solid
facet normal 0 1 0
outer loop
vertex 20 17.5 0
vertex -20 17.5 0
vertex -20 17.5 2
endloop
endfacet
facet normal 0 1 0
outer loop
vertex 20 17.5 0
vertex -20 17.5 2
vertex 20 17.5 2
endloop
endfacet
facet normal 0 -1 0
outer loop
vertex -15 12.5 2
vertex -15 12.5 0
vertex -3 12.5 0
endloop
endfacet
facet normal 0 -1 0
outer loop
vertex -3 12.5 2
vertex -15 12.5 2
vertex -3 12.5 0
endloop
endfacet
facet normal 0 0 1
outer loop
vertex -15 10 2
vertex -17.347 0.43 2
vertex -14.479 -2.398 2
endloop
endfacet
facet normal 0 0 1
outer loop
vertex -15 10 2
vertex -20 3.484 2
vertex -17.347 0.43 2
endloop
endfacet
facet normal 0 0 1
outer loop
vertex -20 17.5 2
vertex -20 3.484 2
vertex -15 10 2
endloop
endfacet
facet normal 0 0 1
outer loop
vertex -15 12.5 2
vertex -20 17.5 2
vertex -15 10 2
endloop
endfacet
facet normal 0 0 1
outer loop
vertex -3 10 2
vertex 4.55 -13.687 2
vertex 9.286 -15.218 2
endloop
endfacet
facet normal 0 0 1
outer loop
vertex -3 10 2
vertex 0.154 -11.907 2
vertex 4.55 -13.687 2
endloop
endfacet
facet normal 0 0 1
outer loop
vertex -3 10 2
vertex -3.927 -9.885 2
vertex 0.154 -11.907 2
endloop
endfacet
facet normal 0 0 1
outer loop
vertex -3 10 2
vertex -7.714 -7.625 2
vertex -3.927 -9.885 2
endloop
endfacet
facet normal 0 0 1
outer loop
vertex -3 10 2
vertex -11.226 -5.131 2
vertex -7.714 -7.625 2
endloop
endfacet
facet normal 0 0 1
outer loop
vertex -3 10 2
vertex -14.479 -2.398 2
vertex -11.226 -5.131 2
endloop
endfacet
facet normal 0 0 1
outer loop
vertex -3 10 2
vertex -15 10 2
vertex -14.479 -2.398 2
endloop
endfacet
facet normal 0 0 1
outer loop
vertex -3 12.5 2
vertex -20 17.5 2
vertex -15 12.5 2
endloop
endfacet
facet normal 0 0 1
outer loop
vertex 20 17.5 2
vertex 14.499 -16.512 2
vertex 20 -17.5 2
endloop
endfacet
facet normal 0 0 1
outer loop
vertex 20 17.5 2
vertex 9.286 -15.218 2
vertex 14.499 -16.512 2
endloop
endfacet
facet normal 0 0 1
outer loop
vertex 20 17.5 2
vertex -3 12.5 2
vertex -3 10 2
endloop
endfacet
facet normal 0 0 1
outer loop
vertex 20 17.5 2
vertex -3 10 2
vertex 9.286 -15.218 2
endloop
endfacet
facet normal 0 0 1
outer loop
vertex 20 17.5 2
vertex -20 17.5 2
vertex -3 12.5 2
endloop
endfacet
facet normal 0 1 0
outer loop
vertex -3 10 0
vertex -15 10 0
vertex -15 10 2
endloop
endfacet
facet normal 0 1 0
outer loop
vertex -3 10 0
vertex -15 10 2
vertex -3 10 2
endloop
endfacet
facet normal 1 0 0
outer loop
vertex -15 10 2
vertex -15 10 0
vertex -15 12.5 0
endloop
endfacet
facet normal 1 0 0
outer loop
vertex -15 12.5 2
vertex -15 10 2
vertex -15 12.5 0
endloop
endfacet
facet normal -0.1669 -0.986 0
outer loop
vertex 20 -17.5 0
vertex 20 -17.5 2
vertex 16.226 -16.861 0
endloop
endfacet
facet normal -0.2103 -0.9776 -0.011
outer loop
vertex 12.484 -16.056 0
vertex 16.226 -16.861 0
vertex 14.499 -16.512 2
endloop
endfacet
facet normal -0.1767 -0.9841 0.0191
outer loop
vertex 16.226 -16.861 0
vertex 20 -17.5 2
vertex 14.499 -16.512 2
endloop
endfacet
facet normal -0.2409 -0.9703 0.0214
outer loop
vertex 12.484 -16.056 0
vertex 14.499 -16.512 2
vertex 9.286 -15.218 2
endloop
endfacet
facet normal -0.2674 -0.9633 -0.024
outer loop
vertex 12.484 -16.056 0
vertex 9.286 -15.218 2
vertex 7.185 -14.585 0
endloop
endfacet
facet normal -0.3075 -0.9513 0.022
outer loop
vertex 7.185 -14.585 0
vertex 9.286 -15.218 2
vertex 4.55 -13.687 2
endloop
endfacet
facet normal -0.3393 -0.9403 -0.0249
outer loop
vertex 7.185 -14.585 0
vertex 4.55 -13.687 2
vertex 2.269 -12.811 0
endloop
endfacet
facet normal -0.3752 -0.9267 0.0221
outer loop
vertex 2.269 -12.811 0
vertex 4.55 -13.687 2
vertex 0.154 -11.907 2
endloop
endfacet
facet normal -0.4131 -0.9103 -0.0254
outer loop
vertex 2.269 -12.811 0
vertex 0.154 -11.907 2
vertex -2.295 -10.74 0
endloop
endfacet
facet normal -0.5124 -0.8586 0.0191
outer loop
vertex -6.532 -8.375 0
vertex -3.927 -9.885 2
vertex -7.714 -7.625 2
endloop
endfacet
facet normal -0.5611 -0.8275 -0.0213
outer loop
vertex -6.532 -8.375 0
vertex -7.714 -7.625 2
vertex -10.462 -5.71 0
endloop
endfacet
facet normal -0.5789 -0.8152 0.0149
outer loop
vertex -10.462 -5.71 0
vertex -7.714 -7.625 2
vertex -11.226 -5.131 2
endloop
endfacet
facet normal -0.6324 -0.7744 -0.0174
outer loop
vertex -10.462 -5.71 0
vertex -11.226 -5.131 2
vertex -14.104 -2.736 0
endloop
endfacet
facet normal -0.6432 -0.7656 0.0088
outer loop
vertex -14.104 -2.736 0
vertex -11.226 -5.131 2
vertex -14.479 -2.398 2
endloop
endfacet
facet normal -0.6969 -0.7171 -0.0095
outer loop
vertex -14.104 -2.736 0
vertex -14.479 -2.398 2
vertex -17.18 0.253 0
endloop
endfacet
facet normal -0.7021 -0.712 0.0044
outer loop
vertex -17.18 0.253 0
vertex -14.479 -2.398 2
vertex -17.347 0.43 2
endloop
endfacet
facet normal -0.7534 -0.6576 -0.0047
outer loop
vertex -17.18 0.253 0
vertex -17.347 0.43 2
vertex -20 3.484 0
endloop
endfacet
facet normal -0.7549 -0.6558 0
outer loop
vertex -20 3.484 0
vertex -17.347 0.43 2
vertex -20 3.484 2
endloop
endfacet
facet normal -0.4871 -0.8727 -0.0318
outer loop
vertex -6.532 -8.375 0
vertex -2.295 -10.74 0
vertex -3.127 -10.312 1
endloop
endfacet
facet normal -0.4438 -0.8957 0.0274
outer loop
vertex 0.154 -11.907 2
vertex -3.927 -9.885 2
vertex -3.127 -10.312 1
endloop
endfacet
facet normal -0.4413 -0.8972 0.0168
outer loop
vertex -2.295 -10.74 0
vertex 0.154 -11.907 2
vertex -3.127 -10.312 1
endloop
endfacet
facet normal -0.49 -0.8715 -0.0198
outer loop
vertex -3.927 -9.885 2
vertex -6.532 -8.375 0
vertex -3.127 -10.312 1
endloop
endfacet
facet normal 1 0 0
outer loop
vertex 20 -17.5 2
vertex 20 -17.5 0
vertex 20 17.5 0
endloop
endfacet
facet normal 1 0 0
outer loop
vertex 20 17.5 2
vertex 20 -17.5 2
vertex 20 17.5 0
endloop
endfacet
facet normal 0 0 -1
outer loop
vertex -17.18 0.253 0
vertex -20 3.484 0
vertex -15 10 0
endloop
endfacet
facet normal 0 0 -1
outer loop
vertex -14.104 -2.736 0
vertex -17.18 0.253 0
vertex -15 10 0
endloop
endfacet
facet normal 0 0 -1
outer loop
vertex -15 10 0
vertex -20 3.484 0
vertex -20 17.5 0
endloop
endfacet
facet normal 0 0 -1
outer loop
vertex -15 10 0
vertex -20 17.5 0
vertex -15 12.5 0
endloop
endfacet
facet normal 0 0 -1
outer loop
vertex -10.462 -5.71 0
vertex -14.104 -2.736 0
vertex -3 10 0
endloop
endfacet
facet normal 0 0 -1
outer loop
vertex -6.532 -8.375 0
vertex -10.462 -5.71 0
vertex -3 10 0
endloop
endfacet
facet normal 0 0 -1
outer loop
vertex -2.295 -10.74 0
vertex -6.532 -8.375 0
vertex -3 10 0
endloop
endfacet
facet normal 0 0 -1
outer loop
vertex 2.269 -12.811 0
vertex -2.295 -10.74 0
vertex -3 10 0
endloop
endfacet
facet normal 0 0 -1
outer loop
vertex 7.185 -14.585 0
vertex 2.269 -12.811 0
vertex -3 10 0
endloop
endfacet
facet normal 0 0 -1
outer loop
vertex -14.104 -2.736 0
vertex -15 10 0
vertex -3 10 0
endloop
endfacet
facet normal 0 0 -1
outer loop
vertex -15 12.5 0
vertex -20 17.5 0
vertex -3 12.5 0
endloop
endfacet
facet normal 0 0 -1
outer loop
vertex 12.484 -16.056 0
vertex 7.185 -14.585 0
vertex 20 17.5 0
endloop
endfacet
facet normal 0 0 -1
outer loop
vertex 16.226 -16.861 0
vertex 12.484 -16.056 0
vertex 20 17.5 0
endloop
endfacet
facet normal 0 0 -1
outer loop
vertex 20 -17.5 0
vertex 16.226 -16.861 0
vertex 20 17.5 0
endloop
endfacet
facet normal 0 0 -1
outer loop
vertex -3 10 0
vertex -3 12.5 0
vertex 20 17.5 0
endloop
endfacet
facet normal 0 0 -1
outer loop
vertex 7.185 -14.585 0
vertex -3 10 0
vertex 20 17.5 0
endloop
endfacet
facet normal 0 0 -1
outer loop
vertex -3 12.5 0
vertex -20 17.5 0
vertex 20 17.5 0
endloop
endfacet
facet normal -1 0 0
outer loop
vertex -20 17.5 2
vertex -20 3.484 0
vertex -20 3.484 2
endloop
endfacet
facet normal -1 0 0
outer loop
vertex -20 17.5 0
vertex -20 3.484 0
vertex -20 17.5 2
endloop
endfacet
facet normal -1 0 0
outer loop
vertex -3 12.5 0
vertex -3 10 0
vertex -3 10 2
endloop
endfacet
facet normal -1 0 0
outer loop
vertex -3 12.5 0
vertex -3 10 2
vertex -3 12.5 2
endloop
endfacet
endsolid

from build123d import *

# Parameters (mm, degrees)
ESQUISSE1_W             = 40
ESQUISSE1_H             = 35
ESQUISSE1_W_2           = 12
ESQUISSE1_H_2           = 2.5
BOSS_EXTRU_1_DEPTH      = 2
ENL_V_MAT_EXTRU_1_DEPTH = 10


with BuildPart() as part:
    # Esquisse1 → Boss.-Extru.1 (new body)
    with BuildSketch(Plane.XY):
        Rectangle(ESQUISSE1_W, ESQUISSE1_H)
        with Locations((-9, 11.25)):
            Rectangle(ESQUISSE1_W_2, ESQUISSE1_H_2, mode=Mode.SUBTRACT)
    extrude(amount=BOSS_EXTRU_1_DEPTH)

    # Esquisse2 → Enlèv. mat.-Extru.1 (cut)
    with BuildSketch(Plane.XY.offset(2)):
        with BuildLine():
            Line((-28.030678158, 16.936481773), (-23.254011087, -35.479522979))
            Line((-23.254011087, -35.479522979), (20, -17.5))
            add(Edge.make_bspline(
                [(20, -17.5), (-15.360660847, -12.269480231), (-28.030678158, 16.936481773)],
                knots=[0, 0, 0, 1, 1, 1], degree=2))
        make_face()
    extrude(amount=-ENL_V_MAT_EXTRU_1_DEPTH, mode=Mode.SUBTRACT)


solid = part.part
